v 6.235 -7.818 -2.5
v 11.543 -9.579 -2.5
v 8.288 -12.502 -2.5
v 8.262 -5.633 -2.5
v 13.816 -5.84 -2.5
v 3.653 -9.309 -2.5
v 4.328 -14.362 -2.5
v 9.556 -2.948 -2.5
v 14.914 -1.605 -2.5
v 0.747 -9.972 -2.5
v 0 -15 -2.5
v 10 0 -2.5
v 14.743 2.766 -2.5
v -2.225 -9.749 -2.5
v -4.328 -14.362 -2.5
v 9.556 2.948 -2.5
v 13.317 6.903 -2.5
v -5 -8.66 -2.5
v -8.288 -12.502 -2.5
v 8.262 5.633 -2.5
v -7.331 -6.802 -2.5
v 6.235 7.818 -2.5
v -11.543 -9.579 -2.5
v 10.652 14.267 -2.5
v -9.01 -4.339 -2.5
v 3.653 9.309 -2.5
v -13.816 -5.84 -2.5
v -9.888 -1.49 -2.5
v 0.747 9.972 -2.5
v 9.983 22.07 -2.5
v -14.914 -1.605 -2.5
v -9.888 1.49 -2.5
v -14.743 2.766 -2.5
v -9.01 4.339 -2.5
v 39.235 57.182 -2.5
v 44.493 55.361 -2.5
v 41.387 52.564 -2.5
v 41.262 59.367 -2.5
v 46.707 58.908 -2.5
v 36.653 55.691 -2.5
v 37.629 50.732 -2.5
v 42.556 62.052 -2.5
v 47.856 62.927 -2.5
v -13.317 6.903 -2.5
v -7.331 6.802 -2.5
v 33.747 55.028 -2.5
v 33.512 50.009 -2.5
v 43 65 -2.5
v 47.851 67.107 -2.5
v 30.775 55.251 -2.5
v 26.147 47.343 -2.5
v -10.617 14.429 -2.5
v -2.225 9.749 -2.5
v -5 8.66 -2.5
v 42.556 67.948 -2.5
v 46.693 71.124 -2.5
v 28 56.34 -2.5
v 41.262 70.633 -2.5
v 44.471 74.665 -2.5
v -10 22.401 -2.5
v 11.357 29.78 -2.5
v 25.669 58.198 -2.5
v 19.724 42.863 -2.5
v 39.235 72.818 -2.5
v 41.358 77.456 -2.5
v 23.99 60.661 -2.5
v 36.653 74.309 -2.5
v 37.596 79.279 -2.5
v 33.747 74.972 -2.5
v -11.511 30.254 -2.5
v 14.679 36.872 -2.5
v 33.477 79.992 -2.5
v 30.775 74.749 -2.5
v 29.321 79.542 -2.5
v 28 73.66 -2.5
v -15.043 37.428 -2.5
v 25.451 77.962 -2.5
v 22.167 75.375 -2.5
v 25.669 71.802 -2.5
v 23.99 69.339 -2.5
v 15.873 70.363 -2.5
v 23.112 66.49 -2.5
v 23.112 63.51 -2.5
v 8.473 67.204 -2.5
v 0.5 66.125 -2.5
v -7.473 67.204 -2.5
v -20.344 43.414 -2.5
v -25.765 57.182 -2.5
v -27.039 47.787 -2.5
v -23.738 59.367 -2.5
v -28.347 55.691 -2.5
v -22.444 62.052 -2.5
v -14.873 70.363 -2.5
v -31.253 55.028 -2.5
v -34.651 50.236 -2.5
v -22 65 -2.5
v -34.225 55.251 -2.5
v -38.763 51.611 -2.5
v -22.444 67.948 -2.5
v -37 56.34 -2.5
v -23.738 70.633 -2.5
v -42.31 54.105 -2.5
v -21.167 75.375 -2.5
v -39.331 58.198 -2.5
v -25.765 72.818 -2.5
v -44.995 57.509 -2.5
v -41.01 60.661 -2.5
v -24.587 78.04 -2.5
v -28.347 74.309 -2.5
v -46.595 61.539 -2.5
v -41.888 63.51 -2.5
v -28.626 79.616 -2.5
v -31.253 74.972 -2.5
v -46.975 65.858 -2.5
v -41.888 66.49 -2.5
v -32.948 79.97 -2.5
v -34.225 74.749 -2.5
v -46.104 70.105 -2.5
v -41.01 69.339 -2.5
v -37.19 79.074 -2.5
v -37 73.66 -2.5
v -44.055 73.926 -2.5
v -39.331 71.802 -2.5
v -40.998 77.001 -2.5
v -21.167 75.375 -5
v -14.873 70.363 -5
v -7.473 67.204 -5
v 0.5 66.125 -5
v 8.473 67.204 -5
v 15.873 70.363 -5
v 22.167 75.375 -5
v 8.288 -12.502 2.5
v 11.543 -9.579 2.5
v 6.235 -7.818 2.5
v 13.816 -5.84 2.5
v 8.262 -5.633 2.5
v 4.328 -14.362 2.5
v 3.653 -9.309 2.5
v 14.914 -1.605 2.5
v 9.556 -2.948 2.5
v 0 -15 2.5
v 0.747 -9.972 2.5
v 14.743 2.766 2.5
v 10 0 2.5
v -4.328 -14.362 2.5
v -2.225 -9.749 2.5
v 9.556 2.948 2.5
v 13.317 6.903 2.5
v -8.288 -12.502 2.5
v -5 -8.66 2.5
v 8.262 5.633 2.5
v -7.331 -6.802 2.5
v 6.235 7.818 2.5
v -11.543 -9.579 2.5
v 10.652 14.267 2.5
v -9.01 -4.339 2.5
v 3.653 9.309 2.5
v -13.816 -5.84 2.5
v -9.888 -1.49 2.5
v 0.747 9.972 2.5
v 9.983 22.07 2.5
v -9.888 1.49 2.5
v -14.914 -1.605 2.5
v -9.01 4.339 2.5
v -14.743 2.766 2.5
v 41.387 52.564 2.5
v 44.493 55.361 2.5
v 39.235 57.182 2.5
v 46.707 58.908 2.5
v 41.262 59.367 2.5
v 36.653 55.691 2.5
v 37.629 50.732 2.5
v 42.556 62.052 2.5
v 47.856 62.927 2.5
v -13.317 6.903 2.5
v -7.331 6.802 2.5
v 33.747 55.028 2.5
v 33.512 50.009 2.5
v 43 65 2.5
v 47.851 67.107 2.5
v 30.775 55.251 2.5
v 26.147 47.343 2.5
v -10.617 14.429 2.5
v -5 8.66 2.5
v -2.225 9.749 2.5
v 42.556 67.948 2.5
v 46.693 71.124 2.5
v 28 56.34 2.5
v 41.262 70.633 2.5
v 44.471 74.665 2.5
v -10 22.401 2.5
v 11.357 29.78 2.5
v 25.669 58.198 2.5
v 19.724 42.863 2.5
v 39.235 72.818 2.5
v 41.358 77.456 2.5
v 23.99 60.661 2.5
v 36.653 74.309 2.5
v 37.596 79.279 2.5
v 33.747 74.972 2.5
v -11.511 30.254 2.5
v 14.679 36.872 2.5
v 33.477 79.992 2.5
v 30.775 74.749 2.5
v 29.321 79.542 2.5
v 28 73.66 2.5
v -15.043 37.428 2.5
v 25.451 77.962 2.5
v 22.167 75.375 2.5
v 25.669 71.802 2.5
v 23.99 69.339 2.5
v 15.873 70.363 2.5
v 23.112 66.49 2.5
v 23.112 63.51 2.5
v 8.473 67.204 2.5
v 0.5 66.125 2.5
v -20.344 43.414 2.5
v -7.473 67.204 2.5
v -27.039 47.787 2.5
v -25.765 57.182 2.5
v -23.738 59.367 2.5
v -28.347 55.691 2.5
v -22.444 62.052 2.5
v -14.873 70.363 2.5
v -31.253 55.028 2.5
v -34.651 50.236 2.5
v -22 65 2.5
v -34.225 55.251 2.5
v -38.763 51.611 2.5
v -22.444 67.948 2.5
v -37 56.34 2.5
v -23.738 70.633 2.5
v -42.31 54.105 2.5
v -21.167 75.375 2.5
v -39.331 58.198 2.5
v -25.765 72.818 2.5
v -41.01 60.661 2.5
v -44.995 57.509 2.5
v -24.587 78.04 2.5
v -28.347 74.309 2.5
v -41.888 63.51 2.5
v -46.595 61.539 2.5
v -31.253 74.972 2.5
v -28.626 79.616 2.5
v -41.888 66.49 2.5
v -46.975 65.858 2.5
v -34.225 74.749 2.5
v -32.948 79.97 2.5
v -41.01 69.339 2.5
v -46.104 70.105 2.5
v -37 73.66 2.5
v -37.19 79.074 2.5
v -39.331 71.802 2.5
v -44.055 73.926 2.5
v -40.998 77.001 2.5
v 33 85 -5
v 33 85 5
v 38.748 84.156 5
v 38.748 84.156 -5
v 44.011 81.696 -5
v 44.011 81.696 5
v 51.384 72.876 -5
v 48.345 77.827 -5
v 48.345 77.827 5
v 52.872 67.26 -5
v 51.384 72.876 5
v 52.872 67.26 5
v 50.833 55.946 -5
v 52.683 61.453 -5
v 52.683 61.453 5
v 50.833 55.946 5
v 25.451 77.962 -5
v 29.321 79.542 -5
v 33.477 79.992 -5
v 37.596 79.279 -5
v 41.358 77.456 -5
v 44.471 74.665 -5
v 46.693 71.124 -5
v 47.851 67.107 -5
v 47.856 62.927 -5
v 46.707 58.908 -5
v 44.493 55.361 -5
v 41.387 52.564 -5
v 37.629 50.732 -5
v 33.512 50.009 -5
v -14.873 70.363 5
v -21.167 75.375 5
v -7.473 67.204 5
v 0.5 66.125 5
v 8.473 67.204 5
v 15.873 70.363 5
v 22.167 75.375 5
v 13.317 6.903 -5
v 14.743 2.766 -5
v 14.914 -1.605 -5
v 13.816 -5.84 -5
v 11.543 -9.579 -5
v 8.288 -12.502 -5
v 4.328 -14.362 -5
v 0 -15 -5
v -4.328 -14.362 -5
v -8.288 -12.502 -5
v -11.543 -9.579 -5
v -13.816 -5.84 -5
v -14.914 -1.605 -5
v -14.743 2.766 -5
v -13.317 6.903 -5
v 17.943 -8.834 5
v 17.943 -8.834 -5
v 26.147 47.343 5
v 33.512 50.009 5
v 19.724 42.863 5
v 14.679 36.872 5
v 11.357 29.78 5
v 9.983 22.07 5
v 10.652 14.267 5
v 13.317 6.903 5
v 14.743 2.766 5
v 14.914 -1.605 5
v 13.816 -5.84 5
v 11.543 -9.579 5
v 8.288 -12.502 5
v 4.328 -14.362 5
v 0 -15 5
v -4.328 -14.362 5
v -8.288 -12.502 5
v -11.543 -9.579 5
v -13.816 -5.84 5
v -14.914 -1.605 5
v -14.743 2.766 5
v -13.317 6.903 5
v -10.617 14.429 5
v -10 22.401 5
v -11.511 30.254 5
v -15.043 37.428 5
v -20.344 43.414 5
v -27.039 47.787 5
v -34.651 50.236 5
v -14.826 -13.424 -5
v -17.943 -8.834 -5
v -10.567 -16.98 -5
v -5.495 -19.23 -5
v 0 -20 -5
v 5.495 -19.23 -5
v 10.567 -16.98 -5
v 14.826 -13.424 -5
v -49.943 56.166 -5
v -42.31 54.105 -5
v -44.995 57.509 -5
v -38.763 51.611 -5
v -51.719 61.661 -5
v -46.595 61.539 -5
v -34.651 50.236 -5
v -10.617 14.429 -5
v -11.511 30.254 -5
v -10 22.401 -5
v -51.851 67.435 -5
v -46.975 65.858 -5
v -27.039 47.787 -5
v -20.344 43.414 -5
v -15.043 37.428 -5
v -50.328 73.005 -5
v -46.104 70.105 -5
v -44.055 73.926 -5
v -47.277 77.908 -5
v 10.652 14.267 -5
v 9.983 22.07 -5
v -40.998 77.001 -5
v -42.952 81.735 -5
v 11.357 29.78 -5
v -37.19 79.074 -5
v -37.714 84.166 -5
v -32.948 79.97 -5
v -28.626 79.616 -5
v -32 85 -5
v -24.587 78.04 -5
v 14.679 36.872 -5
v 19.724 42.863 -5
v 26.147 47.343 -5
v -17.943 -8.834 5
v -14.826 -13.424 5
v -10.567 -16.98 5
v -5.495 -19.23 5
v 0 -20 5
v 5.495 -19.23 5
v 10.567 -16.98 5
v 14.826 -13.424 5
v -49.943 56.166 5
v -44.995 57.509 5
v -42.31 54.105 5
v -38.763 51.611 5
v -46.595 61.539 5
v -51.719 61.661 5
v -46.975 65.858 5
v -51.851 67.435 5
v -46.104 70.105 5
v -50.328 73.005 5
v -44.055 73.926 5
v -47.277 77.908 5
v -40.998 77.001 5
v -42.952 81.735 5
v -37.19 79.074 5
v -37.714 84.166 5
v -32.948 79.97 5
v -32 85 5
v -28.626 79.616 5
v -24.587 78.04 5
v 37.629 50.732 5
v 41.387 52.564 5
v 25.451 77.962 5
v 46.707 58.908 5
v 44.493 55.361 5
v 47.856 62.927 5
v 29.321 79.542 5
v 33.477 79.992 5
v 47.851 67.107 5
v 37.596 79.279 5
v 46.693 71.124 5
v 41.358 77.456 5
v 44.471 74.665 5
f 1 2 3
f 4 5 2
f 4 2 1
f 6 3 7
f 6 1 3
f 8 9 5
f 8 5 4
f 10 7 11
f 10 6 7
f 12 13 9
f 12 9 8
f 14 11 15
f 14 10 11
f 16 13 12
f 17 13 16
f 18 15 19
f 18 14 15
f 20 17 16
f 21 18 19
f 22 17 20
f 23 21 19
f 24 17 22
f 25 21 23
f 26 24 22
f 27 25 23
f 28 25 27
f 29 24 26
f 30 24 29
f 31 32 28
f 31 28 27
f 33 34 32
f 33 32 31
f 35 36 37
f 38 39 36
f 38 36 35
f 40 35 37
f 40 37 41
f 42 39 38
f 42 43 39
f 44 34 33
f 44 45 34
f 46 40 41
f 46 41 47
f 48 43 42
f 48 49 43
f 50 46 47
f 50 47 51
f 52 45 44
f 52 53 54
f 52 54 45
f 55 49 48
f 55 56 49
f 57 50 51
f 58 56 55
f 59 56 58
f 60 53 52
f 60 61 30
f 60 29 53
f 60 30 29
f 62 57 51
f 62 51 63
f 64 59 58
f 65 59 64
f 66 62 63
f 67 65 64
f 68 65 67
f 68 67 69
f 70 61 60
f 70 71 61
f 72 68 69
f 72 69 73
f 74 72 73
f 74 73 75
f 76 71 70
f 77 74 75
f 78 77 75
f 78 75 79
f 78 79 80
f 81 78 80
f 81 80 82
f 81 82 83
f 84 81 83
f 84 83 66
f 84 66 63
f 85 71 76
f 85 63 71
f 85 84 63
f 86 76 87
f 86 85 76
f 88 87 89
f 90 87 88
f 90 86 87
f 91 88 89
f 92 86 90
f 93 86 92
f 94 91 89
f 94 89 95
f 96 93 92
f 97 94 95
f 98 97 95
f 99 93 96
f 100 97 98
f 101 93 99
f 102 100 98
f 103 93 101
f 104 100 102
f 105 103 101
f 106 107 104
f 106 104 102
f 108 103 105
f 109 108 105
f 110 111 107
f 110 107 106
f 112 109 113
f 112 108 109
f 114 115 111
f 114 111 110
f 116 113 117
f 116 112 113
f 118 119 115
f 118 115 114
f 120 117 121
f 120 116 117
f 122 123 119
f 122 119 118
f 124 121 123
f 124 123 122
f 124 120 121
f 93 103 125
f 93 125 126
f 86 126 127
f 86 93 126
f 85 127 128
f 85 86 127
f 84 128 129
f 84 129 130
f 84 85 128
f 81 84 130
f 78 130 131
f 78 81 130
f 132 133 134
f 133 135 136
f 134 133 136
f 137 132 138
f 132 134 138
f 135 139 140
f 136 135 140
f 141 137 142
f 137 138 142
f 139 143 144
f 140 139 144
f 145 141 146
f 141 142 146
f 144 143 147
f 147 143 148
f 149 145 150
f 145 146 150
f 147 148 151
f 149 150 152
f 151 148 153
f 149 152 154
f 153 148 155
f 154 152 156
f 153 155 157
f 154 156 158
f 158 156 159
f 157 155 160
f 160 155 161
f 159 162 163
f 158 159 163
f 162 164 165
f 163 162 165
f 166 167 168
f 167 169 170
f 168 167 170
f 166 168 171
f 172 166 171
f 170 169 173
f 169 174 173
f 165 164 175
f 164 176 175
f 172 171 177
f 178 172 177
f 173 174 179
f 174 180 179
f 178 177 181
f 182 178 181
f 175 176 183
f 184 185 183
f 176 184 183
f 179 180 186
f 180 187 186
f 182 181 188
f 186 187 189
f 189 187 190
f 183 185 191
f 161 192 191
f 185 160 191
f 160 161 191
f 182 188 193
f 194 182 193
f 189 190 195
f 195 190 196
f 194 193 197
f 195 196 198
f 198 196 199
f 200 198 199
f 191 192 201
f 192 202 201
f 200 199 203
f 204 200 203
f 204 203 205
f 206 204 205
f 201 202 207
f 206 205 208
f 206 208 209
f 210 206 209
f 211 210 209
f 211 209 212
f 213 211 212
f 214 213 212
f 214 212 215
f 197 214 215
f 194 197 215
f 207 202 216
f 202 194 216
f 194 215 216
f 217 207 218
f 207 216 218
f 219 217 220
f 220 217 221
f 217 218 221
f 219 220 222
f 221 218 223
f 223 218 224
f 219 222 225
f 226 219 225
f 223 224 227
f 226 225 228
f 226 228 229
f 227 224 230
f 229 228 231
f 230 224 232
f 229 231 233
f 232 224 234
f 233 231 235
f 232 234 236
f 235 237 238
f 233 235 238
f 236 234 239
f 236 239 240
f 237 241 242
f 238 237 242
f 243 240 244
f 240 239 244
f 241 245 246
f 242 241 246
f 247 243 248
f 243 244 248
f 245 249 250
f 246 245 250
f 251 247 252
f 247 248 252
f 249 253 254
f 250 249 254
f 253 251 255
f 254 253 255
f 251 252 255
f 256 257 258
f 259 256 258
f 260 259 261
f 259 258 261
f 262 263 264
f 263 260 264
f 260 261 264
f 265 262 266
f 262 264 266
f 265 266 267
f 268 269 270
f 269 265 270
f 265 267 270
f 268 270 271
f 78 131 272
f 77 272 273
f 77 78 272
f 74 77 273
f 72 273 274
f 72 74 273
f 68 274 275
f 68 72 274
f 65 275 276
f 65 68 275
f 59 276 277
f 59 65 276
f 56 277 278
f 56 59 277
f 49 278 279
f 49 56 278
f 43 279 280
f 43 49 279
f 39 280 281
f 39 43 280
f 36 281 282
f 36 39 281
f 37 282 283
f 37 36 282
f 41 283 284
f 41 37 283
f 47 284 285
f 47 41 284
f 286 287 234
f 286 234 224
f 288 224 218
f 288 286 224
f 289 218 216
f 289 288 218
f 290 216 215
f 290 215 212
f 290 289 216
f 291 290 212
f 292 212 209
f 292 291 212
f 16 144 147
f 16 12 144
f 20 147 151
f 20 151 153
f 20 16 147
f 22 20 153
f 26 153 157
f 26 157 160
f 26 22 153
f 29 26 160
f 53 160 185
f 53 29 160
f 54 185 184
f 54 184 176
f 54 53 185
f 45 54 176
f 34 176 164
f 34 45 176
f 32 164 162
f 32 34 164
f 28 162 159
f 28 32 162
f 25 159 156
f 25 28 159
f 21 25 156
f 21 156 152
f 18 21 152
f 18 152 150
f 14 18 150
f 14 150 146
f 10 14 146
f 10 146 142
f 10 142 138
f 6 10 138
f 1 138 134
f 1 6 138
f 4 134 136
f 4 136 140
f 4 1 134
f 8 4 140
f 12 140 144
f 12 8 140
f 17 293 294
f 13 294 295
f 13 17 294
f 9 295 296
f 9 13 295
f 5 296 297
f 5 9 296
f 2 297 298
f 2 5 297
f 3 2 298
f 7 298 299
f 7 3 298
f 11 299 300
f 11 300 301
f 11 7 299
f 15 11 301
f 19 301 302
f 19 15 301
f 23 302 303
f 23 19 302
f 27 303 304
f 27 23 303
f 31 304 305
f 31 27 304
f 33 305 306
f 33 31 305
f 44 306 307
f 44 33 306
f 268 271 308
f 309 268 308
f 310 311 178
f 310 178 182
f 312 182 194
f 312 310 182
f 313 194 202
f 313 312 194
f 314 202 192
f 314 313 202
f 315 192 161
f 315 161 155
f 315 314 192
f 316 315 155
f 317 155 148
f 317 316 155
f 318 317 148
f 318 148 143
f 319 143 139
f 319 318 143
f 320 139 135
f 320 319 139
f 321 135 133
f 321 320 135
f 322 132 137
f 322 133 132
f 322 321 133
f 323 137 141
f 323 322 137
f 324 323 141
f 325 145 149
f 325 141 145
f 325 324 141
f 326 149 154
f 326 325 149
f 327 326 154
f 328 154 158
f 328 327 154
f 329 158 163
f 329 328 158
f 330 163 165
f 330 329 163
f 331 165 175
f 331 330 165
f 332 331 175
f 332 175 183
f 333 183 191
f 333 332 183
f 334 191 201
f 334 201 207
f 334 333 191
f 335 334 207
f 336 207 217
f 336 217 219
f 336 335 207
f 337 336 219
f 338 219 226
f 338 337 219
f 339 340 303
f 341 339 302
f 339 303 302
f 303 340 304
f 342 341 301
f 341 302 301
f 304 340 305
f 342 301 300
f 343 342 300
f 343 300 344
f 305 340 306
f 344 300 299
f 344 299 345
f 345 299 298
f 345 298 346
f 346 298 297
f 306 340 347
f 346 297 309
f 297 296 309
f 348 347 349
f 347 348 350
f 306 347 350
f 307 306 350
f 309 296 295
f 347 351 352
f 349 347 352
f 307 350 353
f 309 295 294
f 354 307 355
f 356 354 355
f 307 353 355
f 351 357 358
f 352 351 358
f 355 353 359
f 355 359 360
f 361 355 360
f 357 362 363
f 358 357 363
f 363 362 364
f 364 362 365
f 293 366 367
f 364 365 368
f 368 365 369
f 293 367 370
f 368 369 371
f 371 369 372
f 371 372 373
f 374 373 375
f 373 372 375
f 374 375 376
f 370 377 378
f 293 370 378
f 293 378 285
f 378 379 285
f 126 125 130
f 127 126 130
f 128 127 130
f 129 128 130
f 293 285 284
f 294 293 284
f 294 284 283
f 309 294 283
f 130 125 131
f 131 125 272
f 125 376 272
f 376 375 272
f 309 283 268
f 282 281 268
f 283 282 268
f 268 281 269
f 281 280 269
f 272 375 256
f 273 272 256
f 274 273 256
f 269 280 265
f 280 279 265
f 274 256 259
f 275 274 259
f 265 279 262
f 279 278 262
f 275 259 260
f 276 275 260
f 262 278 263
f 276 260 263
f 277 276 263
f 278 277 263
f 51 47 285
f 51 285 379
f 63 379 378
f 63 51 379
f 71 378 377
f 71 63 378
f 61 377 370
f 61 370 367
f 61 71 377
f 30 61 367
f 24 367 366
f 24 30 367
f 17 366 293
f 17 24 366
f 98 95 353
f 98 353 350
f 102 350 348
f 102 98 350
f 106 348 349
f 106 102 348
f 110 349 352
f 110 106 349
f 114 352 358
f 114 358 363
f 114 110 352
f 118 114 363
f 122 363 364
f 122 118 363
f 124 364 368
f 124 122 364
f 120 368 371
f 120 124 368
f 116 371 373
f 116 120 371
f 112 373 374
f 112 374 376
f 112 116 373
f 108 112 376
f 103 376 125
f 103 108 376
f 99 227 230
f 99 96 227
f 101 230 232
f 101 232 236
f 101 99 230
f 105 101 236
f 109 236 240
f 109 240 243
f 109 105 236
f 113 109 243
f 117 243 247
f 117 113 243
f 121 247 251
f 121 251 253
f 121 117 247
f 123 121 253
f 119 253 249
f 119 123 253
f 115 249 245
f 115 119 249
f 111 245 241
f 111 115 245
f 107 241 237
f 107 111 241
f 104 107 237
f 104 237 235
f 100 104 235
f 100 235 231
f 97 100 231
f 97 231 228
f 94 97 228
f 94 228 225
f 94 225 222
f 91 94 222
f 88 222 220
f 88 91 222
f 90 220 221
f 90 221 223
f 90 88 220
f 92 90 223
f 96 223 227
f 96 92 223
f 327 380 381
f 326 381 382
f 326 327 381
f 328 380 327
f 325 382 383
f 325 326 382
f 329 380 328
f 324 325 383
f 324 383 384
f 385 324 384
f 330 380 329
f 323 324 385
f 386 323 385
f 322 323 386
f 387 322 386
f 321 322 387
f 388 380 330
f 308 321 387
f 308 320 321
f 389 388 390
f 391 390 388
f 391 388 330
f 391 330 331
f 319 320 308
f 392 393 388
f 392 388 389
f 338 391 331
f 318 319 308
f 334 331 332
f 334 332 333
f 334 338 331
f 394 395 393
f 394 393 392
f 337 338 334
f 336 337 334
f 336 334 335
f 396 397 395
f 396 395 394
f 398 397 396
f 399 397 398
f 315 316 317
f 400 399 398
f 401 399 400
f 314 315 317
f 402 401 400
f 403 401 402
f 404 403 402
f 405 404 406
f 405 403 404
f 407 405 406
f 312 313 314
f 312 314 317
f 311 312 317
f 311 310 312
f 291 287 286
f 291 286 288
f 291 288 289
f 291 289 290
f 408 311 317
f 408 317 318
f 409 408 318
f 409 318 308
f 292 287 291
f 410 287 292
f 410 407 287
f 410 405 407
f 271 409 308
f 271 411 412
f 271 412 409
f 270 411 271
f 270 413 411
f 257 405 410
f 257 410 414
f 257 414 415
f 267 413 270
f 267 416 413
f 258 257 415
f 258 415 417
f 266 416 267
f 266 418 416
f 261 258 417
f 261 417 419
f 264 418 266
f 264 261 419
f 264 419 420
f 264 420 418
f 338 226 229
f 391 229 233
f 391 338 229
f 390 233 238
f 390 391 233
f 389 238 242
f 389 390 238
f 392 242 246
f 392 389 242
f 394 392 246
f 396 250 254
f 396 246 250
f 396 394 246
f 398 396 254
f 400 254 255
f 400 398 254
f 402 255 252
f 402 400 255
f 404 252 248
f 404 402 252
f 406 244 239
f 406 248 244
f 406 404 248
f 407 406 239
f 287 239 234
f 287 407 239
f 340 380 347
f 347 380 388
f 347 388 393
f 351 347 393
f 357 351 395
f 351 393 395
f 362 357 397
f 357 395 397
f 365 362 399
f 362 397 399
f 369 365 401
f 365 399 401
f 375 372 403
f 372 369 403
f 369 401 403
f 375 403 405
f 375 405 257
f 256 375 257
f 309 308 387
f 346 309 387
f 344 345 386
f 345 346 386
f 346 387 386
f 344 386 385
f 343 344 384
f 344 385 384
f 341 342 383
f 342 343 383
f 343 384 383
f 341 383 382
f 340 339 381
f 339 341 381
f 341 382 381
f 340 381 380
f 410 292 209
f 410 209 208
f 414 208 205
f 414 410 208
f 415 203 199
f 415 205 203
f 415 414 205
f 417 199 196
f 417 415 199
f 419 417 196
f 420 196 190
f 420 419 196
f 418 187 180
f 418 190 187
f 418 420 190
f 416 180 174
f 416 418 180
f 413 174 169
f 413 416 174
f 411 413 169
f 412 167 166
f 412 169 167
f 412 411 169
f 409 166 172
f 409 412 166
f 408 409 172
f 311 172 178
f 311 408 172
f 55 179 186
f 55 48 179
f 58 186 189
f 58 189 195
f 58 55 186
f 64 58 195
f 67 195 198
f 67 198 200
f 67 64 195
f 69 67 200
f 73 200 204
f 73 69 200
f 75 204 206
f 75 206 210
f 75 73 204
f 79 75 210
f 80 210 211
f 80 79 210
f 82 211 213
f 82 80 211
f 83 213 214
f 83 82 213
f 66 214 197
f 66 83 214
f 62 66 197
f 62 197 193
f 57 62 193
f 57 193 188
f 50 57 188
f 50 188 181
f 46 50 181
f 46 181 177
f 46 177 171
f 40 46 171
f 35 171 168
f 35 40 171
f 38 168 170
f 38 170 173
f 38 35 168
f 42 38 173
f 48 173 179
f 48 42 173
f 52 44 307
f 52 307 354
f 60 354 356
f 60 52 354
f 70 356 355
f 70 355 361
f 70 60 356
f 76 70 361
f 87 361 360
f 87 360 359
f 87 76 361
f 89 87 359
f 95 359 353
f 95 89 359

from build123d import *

# Parameters (mm, degrees)
BOSS_EXTRUDE1_DEPTH = 5
SKETCH1_3_R         = 10
BOSS_EXTRUDE2_DEPTH = 2.5


with BuildPart() as part:
    # Sketch1 → Boss-Extrude1 (new, symmetric)
    with BuildSketch(Plane.XY):
        with BuildLine():
            Line((33, 85), (-32, 85))
            ThreePointArc((-32, 85), (-48.980483062, 75.567080721), (-49.943413521, 56.166319497))
            Line((-49.943413521, 56.166319497), (-17.943413521, -8.833680503))
            ThreePointArc((-17.943413521, -8.833680503), (0, -20), (17.943413521, -8.833680503))
            Line((17.943413521, -8.833680503), (50.833146609, 55.945780983))
            ThreePointArc((50.833146609, 55.945780983), (50.045298184, 75.46220865), (33, 85))
        make_face()
        with BuildLine():
            ThreePointArc((13.317368267, 6.90273152), (0, -15), (-13.317368267, 6.90273152))
            ThreePointArc((-13.317368267, 6.90273152), (-13.036984521, 33.958715313), (-34.650701601, 50.236064853))
            ThreePointArc((-34.650701601, 50.236064853), (-45.218522192, 72.090181314), (-21.166666667, 75.374916332))
            ThreePointArc((-21.166666667, 75.374916332), (0.5, 66.124748995), (22.166666667, 75.374916332))
            ThreePointArc((22.166666667, 75.374916332), (46.692872743, 71.124151864), (33.511719921, 50.008731117))
            ThreePointArc((33.511719921, 50.008731117), (12.785531325, 33.43522428), (13.317368267, 6.90273152))
        make_face(mode=Mode.SUBTRACT)
    extrude(amount=BOSS_EXTRUDE1_DEPTH, both=True)

    # Sketch1<3> → Boss-Extrude2 (add, symmetric)
    with BuildSketch(Plane.XY):
        with BuildLine():
            ThreePointArc((-34.650701601, 50.236064853), (-13.036984521, 33.958715313), (-13.317368267, 6.90273152))
            ThreePointArc((-13.317368267, 6.90273152), (0, -15), (13.317368267, 6.90273152))
            ThreePointArc((13.317368267, 6.90273152), (12.785531325, 33.43522428), (33.511719921, 50.008731117))
            ThreePointArc((33.511719921, 50.008731117), (46.692872743, 71.124151864), (22.166666667, 75.374916332))
            ThreePointArc((22.166666667, 75.374916332), (0.5, 66.124748995), (-21.166666667, 75.374916332))
            ThreePointArc((-21.166666667, 75.374916332), (-45.218522192, 72.090181314), (-34.650701601, 50.236064853))
        make_face()
        Circle(SKETCH1_3_R, mode=Mode.SUBTRACT)
        with Locations((-32, 65)):
            Circle(SKETCH1_3_R, mode=Mode.SUBTRACT)
        with Locations((33, 65)):
            Circle(SKETCH1_3_R, mode=Mode.SUBTRACT)
    extrude(amount=BOSS_EXTRUDE2_DEPTH, both=True)


solid = part.part
